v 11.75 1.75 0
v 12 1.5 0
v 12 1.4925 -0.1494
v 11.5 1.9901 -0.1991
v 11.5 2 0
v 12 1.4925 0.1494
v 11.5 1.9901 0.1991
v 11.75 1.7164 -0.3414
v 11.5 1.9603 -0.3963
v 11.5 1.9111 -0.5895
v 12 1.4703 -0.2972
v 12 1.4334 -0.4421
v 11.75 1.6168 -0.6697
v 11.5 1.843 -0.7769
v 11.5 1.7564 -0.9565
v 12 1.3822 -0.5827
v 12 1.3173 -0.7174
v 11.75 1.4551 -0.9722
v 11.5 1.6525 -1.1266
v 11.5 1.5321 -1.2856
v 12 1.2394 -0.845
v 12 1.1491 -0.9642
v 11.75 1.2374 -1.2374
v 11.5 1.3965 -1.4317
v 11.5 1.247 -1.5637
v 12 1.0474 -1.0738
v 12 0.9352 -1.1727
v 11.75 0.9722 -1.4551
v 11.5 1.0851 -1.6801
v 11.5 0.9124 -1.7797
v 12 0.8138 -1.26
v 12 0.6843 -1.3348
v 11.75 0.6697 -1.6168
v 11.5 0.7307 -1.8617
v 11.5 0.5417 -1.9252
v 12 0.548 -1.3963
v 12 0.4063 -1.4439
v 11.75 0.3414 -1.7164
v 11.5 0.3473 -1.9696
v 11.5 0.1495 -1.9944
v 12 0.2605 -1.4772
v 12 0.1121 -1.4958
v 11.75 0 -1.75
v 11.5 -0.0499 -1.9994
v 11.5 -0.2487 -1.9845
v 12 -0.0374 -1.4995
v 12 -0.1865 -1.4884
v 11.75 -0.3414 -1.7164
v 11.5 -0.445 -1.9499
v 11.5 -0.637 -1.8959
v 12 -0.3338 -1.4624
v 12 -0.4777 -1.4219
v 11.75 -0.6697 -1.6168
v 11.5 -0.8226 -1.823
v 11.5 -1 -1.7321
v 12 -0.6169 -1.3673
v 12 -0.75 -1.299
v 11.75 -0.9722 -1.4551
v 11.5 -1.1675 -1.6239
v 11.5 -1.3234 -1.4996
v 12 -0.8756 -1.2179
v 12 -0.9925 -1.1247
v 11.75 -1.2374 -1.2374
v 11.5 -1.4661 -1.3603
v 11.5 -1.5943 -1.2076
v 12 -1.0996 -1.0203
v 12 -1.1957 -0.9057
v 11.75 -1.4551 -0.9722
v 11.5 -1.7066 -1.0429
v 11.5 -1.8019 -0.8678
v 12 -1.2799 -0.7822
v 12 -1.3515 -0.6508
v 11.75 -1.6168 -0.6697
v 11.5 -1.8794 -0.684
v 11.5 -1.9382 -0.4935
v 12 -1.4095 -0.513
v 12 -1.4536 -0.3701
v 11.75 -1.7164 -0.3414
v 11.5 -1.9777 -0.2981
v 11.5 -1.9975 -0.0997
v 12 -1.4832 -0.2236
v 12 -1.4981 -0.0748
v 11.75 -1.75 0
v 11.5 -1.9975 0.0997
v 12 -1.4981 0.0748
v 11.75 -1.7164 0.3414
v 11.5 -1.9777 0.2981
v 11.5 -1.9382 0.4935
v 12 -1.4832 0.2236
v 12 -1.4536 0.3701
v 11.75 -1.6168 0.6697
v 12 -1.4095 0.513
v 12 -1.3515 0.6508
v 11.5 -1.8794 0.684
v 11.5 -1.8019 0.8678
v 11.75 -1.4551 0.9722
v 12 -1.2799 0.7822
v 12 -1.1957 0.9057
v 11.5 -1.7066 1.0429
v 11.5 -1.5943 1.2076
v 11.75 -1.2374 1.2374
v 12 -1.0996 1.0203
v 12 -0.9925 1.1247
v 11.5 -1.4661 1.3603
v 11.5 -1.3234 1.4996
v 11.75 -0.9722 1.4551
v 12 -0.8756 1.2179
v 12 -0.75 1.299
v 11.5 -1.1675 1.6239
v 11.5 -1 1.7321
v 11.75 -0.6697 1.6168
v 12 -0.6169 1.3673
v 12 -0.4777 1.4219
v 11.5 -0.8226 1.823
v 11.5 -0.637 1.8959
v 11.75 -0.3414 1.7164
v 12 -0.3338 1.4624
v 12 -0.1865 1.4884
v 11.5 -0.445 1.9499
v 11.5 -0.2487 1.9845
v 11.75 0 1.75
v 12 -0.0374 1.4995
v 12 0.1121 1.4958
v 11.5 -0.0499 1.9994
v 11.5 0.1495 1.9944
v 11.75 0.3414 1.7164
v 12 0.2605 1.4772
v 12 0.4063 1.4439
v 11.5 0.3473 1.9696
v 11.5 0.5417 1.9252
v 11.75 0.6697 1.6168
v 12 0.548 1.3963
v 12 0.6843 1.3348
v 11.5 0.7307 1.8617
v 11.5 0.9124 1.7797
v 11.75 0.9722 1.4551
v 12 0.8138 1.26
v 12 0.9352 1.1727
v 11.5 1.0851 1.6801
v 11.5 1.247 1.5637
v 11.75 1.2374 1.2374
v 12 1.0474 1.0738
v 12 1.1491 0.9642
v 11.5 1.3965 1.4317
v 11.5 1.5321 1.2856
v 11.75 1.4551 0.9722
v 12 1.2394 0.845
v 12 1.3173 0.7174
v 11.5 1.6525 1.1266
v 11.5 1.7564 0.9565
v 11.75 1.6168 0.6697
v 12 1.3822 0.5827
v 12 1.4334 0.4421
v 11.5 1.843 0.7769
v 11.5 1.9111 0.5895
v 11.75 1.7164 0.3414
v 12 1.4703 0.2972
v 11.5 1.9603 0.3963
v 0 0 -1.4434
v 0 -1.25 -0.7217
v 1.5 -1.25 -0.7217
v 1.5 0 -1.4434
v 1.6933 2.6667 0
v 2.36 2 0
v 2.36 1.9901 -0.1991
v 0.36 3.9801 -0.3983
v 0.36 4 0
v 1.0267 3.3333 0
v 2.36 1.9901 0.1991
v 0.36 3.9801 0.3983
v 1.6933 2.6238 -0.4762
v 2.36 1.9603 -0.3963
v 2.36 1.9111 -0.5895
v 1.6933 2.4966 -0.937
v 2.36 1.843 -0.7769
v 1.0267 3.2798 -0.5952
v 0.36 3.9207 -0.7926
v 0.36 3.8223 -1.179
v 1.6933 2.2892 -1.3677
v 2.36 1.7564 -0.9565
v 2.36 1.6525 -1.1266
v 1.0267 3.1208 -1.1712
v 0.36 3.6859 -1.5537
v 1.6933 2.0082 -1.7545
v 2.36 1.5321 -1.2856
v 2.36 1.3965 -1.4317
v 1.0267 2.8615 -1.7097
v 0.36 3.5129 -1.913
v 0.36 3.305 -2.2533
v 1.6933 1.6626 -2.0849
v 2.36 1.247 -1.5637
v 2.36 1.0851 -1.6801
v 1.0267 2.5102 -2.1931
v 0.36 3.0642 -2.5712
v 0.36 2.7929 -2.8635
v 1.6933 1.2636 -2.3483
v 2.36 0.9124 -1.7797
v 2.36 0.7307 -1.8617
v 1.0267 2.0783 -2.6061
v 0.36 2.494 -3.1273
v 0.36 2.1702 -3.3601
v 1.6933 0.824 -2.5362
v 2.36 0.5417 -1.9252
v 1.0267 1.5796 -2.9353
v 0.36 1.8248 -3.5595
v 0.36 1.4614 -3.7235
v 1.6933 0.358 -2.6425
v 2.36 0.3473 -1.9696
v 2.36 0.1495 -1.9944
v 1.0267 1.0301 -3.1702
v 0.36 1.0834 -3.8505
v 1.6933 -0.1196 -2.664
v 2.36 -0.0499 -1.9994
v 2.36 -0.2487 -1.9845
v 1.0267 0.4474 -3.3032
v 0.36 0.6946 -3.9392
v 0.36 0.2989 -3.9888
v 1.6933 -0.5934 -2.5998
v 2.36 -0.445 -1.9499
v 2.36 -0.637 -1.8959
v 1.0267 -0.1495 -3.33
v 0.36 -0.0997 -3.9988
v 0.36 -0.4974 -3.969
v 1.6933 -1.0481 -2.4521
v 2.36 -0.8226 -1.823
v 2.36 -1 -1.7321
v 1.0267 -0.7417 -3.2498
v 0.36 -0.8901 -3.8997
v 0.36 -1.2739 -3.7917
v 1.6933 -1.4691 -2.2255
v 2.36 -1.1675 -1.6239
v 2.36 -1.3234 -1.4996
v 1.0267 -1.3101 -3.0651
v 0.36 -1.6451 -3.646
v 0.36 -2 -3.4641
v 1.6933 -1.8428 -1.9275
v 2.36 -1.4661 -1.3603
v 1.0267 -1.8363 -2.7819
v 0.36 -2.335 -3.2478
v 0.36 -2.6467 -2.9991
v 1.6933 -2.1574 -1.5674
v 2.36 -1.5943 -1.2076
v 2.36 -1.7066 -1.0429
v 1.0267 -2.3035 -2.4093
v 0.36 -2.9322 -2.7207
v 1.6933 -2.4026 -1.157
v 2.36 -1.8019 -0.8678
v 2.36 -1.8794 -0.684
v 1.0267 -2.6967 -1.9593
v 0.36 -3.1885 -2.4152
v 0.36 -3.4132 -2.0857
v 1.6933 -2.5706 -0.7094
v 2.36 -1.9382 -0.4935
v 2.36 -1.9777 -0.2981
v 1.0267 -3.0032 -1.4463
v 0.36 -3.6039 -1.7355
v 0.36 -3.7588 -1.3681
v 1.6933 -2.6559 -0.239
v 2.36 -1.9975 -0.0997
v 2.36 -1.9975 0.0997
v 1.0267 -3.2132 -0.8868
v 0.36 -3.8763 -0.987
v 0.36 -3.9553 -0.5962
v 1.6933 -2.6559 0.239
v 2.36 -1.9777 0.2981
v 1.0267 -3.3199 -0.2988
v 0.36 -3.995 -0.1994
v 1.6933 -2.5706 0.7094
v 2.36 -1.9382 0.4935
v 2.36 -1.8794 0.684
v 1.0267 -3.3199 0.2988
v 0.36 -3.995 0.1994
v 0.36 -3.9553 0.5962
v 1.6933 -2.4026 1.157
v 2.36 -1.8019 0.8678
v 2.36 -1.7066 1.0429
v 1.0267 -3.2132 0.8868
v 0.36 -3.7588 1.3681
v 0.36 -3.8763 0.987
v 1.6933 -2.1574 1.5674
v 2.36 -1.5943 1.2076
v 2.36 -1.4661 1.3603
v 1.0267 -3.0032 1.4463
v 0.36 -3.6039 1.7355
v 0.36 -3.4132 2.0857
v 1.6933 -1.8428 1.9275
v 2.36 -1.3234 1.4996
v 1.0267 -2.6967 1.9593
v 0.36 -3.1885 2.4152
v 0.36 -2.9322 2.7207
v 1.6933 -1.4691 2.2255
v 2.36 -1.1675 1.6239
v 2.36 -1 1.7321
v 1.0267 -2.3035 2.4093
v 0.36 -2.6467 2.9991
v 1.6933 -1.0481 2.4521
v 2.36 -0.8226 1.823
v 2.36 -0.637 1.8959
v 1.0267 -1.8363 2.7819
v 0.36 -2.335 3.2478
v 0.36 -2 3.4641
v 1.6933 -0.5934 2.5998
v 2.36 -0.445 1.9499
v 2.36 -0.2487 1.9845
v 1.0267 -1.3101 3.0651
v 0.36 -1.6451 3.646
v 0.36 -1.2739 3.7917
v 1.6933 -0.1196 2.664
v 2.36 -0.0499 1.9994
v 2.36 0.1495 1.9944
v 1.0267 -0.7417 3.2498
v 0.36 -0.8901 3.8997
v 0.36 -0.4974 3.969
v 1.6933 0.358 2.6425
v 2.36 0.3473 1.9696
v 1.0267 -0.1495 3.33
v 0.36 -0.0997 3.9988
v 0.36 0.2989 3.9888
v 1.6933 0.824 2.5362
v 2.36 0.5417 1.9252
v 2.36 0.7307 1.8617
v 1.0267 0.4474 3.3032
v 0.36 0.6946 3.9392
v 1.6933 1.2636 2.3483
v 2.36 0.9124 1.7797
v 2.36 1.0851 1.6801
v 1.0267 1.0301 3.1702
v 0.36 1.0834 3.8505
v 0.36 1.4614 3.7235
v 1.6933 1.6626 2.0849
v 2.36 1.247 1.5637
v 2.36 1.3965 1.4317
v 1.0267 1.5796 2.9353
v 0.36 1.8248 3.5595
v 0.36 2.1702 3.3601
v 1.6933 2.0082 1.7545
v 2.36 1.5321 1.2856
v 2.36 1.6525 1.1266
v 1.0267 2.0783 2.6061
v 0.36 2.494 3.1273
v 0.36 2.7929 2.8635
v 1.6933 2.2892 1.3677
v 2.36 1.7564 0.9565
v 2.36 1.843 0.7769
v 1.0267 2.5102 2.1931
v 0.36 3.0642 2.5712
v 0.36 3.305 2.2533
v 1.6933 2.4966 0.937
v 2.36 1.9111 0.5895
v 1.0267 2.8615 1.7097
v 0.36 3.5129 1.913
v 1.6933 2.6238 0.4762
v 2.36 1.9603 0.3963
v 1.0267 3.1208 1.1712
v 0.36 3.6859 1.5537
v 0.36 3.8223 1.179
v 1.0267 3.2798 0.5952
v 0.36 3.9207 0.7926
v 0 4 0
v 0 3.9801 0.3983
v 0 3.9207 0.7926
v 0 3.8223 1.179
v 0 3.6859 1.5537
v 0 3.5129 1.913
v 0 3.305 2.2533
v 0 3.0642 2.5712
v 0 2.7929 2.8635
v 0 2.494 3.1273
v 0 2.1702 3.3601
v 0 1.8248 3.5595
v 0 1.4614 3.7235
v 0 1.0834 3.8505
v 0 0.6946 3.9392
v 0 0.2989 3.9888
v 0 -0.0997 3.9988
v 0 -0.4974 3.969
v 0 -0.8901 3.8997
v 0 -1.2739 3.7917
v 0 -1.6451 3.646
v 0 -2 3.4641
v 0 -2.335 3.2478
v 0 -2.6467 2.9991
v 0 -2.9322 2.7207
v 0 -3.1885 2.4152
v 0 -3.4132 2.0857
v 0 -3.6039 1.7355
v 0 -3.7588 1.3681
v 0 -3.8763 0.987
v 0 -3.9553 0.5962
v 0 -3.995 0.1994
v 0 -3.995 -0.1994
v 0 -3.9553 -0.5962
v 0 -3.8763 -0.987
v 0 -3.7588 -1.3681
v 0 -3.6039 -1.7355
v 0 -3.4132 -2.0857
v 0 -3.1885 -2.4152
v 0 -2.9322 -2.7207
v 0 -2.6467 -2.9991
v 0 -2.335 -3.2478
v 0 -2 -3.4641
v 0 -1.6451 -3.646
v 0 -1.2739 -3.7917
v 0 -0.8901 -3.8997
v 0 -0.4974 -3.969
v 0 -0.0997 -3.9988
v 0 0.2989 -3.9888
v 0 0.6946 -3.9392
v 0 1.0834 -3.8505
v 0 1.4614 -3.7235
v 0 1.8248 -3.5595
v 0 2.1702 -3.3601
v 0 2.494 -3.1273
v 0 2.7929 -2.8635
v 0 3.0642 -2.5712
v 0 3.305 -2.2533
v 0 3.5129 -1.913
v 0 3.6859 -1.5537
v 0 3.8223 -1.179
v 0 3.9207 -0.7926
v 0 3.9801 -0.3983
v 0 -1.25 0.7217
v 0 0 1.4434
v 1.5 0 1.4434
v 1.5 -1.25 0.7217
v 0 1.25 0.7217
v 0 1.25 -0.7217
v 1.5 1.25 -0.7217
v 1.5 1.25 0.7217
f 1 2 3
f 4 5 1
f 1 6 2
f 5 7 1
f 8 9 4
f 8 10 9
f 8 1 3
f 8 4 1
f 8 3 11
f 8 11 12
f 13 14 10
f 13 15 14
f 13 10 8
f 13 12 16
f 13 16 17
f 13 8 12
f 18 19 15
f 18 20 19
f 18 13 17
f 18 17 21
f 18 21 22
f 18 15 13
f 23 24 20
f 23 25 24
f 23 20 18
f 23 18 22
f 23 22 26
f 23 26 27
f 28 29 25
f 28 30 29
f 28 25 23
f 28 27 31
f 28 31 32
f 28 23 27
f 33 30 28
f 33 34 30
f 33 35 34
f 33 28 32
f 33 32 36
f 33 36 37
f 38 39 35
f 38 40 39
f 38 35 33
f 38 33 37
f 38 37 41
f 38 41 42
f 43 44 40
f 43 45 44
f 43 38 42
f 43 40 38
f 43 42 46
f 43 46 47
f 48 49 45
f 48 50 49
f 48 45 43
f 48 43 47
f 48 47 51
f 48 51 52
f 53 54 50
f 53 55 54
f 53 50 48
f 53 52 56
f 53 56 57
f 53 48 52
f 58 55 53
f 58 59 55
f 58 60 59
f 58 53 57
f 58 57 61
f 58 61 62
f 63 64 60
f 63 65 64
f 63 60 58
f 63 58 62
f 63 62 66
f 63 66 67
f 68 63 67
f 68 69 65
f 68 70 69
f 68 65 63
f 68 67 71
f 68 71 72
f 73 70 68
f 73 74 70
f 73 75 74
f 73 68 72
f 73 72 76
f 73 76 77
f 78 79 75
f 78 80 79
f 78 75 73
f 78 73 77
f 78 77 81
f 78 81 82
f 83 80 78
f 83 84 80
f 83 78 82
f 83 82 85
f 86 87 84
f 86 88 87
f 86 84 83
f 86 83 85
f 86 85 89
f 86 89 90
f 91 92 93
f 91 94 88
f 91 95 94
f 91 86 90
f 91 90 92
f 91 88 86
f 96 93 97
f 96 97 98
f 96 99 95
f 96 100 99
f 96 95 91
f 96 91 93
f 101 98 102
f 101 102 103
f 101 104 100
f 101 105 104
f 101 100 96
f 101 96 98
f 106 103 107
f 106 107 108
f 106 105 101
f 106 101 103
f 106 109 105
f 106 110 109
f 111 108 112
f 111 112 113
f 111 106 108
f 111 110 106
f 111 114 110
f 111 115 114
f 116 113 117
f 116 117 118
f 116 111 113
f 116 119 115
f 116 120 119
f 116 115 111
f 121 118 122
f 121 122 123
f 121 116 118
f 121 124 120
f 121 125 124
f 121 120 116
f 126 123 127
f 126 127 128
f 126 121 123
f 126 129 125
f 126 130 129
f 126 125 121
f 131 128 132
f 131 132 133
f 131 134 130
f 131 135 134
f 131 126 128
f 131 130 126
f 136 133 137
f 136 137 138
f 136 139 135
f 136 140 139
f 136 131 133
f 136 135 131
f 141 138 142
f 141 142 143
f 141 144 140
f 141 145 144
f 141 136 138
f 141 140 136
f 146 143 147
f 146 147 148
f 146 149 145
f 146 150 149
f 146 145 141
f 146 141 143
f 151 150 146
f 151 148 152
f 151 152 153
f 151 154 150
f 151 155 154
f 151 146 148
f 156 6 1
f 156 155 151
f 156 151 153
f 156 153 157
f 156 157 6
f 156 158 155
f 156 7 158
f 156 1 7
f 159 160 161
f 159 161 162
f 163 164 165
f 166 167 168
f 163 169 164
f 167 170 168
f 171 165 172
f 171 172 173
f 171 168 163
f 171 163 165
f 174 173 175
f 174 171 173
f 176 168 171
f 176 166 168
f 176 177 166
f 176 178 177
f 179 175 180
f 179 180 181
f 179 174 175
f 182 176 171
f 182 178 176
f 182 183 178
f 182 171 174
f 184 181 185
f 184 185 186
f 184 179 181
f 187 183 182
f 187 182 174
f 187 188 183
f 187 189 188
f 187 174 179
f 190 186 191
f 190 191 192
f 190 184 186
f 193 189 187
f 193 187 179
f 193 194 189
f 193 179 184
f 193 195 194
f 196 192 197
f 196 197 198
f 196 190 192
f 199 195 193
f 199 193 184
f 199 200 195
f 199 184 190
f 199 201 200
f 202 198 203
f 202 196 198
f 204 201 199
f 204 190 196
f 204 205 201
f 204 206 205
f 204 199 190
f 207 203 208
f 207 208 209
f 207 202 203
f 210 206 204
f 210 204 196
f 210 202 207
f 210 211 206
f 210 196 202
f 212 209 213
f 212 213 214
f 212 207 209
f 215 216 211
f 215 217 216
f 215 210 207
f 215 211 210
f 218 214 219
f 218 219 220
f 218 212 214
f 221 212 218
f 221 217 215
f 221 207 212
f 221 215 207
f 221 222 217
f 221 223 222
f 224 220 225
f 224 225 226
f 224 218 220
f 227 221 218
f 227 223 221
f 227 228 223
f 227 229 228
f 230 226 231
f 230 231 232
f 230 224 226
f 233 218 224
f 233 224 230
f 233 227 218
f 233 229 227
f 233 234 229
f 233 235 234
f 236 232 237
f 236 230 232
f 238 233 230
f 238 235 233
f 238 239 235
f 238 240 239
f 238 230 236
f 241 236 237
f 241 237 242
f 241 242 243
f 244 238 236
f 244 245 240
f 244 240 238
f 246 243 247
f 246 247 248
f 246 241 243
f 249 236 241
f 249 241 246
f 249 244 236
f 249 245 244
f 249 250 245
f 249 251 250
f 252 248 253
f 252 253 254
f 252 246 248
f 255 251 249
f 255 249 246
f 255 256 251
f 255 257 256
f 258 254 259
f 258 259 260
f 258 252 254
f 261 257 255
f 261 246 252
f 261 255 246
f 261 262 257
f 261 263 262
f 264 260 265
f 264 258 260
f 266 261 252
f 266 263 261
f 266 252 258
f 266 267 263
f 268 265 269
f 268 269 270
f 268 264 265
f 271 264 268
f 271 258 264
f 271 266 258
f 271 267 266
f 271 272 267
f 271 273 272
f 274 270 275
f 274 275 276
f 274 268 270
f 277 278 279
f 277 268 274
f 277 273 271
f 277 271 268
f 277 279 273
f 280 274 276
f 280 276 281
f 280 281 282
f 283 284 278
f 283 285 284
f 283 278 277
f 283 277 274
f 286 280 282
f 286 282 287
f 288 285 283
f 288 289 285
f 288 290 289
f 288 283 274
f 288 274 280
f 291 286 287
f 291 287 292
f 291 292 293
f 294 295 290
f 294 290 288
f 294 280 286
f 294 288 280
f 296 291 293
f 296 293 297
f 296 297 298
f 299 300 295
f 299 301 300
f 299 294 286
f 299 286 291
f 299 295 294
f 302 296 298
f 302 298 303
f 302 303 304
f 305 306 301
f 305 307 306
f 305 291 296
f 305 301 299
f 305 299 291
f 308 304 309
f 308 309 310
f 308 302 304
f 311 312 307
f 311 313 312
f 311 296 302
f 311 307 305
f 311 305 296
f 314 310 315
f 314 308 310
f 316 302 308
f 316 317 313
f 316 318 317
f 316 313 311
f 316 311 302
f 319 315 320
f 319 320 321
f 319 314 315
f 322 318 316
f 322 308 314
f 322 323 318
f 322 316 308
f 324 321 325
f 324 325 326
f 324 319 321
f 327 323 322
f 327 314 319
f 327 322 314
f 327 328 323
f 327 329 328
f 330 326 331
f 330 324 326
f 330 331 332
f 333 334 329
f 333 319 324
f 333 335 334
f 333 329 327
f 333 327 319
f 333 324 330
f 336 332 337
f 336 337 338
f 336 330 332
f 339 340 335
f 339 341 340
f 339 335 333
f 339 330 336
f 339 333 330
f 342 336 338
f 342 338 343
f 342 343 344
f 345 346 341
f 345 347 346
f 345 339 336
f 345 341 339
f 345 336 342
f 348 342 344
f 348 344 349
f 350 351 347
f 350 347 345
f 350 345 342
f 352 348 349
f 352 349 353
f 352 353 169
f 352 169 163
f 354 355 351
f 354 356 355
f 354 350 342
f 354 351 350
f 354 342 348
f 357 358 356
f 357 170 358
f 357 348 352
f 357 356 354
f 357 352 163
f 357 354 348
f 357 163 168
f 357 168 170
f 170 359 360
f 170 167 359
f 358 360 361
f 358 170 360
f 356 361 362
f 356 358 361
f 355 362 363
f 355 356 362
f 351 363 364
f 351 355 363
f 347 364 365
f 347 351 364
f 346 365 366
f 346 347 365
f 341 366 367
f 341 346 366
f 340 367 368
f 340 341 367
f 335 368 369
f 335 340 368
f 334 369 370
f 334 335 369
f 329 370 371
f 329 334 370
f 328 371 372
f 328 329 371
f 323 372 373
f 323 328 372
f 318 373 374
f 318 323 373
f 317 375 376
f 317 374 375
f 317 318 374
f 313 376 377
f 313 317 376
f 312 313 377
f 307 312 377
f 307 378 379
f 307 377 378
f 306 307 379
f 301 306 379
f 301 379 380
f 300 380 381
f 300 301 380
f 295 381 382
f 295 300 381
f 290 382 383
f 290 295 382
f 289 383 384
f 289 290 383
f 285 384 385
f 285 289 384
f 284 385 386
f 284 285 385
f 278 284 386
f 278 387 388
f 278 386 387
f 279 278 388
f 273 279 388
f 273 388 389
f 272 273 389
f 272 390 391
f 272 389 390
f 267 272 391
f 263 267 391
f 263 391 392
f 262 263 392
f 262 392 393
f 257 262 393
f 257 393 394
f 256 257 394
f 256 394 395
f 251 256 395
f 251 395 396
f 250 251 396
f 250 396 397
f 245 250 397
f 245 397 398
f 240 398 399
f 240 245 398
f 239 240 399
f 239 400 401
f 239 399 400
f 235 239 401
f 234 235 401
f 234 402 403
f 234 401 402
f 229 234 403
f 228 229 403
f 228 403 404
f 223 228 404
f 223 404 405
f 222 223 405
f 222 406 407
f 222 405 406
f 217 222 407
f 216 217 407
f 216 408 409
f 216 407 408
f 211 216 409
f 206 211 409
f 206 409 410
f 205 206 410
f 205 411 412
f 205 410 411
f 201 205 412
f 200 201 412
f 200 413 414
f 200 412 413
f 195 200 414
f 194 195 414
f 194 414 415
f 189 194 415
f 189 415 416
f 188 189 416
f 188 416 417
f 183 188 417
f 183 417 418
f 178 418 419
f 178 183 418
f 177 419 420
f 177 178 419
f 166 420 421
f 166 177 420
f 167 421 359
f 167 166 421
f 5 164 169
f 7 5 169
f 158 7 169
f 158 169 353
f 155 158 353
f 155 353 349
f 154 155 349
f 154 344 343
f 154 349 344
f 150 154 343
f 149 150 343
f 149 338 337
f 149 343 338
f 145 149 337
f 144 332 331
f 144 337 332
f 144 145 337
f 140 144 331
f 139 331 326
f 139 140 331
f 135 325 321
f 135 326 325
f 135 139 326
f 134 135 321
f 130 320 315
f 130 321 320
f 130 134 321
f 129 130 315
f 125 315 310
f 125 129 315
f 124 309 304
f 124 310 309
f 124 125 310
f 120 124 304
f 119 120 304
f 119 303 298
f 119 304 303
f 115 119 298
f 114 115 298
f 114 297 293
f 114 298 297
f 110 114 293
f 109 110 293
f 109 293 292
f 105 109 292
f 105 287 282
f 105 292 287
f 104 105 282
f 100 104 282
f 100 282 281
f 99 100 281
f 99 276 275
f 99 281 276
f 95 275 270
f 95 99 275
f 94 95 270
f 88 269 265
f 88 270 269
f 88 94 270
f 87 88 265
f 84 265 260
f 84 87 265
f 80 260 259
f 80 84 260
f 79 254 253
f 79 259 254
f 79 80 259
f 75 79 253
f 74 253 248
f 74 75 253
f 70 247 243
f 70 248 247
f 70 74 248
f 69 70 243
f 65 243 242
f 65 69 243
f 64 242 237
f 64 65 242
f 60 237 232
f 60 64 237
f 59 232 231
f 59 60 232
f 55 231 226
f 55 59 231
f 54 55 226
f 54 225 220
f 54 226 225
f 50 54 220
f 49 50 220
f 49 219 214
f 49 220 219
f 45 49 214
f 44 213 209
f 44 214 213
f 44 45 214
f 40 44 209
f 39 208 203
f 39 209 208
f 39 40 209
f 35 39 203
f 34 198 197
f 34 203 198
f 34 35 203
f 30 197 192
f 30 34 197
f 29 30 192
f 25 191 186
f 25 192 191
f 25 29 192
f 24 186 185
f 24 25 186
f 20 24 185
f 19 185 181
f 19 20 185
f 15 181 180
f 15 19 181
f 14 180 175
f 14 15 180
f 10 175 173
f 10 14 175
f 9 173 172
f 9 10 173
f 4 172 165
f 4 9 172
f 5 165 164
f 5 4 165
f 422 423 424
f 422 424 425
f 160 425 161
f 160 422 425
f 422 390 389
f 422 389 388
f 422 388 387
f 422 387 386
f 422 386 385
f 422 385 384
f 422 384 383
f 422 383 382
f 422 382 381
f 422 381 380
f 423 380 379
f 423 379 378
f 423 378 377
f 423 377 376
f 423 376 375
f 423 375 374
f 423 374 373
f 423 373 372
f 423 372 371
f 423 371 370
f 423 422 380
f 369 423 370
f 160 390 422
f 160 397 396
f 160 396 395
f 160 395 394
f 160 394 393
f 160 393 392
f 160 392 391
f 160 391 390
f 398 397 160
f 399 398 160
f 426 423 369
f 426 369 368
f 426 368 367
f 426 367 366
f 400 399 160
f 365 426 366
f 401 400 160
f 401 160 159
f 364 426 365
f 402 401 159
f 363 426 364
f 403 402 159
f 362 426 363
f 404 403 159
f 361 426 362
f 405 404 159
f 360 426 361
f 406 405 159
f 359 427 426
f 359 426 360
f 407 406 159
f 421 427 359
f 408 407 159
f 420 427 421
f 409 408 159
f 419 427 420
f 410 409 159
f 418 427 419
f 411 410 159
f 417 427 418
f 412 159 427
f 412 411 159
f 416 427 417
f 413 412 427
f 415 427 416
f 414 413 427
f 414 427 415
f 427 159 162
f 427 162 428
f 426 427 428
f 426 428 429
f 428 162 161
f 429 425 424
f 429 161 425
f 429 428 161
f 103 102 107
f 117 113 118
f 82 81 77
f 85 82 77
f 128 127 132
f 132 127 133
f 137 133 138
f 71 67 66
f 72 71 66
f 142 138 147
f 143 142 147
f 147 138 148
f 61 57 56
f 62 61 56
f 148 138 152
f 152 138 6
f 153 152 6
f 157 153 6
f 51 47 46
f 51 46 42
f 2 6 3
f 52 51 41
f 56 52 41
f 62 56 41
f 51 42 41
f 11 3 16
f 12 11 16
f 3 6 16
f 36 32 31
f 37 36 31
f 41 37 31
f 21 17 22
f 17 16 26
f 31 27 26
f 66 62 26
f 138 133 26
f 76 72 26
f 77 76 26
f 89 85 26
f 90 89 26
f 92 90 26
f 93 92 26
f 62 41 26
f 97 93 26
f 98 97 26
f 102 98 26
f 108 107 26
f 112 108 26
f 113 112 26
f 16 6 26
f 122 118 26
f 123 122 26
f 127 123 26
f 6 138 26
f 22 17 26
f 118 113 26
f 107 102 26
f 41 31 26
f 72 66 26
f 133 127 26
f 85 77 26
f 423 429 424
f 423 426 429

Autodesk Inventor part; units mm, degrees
ref_plane "YZ Plane" through (0, 0, 0) normal (1, 0, 0) x (0, 1, 0)
ref_plane "XZ Plane" through (0, 0, 0) normal (0, 1, 0) x (-1, 0, 0)
ref_plane "XY Plane" through (0, 0, 0) normal (0, 0, 1) x (1, 0, 0)
sketch "Sketch1" plane through (0, 0, 0) normal (0, 0, 1) x (1, 0, 0)
  line L0 (0, 0) -> (0, 4)
  line L1 (0, 4) -> (0.36, 4)
  line L2 (0.36, 4) -> (2.36, 2)
  line L3 (2.36, 2) -> (12, 2)
  line L4 (12, 2) -> (12, 0)
  line L5 (12, 0) -> (0, 0)
  dimension "d0" = 4
  dimension "d1" = 0.36
  dimension "d2" = 135
  dimension "d3" = 12
  dimension "d4" = 2
revolve "Revolution1" add sketch "Sketch1" angle 360 about axis through (12, 0, 0) along (-1, 0, 0)
chamfer "Chamfer1" distance 0.5 angle 45 1 edges at (12, -2, 0)
sketch "Sketch2" plane through (0, 0, 0) normal (-1, 0, 0) x (0, 0, 1)
  circle A0 centre (0, 0) radius 4 projected
  line L0 (-1.4434, 0) -> (-0.7217, 1.25)
  line L1 (-0.7217, 1.25) -> (0.7217, 1.25)
  line L2 (0.7217, 1.25) -> (1.4434, 0)
  line L3 (1.4434, 0) -> (0.7217, -1.25)
  line L4 (0.7217, -1.25) -> (-0.7217, -1.25)
  line L5 (-0.7217, -1.25) -> (-1.4434, 0)
  dimension "d9" = 2.5
extrude "Extrusion1" cut sketch "Sketch2" against normal blind 1.5 contours L0 L1 L2 L3 L4 L5
thread "Thread1" size "M4x0.7" class "6g" standard "ANSI Metric M Profile" full length
properties part number "FHS4x12" material "Steel, Alloy"
